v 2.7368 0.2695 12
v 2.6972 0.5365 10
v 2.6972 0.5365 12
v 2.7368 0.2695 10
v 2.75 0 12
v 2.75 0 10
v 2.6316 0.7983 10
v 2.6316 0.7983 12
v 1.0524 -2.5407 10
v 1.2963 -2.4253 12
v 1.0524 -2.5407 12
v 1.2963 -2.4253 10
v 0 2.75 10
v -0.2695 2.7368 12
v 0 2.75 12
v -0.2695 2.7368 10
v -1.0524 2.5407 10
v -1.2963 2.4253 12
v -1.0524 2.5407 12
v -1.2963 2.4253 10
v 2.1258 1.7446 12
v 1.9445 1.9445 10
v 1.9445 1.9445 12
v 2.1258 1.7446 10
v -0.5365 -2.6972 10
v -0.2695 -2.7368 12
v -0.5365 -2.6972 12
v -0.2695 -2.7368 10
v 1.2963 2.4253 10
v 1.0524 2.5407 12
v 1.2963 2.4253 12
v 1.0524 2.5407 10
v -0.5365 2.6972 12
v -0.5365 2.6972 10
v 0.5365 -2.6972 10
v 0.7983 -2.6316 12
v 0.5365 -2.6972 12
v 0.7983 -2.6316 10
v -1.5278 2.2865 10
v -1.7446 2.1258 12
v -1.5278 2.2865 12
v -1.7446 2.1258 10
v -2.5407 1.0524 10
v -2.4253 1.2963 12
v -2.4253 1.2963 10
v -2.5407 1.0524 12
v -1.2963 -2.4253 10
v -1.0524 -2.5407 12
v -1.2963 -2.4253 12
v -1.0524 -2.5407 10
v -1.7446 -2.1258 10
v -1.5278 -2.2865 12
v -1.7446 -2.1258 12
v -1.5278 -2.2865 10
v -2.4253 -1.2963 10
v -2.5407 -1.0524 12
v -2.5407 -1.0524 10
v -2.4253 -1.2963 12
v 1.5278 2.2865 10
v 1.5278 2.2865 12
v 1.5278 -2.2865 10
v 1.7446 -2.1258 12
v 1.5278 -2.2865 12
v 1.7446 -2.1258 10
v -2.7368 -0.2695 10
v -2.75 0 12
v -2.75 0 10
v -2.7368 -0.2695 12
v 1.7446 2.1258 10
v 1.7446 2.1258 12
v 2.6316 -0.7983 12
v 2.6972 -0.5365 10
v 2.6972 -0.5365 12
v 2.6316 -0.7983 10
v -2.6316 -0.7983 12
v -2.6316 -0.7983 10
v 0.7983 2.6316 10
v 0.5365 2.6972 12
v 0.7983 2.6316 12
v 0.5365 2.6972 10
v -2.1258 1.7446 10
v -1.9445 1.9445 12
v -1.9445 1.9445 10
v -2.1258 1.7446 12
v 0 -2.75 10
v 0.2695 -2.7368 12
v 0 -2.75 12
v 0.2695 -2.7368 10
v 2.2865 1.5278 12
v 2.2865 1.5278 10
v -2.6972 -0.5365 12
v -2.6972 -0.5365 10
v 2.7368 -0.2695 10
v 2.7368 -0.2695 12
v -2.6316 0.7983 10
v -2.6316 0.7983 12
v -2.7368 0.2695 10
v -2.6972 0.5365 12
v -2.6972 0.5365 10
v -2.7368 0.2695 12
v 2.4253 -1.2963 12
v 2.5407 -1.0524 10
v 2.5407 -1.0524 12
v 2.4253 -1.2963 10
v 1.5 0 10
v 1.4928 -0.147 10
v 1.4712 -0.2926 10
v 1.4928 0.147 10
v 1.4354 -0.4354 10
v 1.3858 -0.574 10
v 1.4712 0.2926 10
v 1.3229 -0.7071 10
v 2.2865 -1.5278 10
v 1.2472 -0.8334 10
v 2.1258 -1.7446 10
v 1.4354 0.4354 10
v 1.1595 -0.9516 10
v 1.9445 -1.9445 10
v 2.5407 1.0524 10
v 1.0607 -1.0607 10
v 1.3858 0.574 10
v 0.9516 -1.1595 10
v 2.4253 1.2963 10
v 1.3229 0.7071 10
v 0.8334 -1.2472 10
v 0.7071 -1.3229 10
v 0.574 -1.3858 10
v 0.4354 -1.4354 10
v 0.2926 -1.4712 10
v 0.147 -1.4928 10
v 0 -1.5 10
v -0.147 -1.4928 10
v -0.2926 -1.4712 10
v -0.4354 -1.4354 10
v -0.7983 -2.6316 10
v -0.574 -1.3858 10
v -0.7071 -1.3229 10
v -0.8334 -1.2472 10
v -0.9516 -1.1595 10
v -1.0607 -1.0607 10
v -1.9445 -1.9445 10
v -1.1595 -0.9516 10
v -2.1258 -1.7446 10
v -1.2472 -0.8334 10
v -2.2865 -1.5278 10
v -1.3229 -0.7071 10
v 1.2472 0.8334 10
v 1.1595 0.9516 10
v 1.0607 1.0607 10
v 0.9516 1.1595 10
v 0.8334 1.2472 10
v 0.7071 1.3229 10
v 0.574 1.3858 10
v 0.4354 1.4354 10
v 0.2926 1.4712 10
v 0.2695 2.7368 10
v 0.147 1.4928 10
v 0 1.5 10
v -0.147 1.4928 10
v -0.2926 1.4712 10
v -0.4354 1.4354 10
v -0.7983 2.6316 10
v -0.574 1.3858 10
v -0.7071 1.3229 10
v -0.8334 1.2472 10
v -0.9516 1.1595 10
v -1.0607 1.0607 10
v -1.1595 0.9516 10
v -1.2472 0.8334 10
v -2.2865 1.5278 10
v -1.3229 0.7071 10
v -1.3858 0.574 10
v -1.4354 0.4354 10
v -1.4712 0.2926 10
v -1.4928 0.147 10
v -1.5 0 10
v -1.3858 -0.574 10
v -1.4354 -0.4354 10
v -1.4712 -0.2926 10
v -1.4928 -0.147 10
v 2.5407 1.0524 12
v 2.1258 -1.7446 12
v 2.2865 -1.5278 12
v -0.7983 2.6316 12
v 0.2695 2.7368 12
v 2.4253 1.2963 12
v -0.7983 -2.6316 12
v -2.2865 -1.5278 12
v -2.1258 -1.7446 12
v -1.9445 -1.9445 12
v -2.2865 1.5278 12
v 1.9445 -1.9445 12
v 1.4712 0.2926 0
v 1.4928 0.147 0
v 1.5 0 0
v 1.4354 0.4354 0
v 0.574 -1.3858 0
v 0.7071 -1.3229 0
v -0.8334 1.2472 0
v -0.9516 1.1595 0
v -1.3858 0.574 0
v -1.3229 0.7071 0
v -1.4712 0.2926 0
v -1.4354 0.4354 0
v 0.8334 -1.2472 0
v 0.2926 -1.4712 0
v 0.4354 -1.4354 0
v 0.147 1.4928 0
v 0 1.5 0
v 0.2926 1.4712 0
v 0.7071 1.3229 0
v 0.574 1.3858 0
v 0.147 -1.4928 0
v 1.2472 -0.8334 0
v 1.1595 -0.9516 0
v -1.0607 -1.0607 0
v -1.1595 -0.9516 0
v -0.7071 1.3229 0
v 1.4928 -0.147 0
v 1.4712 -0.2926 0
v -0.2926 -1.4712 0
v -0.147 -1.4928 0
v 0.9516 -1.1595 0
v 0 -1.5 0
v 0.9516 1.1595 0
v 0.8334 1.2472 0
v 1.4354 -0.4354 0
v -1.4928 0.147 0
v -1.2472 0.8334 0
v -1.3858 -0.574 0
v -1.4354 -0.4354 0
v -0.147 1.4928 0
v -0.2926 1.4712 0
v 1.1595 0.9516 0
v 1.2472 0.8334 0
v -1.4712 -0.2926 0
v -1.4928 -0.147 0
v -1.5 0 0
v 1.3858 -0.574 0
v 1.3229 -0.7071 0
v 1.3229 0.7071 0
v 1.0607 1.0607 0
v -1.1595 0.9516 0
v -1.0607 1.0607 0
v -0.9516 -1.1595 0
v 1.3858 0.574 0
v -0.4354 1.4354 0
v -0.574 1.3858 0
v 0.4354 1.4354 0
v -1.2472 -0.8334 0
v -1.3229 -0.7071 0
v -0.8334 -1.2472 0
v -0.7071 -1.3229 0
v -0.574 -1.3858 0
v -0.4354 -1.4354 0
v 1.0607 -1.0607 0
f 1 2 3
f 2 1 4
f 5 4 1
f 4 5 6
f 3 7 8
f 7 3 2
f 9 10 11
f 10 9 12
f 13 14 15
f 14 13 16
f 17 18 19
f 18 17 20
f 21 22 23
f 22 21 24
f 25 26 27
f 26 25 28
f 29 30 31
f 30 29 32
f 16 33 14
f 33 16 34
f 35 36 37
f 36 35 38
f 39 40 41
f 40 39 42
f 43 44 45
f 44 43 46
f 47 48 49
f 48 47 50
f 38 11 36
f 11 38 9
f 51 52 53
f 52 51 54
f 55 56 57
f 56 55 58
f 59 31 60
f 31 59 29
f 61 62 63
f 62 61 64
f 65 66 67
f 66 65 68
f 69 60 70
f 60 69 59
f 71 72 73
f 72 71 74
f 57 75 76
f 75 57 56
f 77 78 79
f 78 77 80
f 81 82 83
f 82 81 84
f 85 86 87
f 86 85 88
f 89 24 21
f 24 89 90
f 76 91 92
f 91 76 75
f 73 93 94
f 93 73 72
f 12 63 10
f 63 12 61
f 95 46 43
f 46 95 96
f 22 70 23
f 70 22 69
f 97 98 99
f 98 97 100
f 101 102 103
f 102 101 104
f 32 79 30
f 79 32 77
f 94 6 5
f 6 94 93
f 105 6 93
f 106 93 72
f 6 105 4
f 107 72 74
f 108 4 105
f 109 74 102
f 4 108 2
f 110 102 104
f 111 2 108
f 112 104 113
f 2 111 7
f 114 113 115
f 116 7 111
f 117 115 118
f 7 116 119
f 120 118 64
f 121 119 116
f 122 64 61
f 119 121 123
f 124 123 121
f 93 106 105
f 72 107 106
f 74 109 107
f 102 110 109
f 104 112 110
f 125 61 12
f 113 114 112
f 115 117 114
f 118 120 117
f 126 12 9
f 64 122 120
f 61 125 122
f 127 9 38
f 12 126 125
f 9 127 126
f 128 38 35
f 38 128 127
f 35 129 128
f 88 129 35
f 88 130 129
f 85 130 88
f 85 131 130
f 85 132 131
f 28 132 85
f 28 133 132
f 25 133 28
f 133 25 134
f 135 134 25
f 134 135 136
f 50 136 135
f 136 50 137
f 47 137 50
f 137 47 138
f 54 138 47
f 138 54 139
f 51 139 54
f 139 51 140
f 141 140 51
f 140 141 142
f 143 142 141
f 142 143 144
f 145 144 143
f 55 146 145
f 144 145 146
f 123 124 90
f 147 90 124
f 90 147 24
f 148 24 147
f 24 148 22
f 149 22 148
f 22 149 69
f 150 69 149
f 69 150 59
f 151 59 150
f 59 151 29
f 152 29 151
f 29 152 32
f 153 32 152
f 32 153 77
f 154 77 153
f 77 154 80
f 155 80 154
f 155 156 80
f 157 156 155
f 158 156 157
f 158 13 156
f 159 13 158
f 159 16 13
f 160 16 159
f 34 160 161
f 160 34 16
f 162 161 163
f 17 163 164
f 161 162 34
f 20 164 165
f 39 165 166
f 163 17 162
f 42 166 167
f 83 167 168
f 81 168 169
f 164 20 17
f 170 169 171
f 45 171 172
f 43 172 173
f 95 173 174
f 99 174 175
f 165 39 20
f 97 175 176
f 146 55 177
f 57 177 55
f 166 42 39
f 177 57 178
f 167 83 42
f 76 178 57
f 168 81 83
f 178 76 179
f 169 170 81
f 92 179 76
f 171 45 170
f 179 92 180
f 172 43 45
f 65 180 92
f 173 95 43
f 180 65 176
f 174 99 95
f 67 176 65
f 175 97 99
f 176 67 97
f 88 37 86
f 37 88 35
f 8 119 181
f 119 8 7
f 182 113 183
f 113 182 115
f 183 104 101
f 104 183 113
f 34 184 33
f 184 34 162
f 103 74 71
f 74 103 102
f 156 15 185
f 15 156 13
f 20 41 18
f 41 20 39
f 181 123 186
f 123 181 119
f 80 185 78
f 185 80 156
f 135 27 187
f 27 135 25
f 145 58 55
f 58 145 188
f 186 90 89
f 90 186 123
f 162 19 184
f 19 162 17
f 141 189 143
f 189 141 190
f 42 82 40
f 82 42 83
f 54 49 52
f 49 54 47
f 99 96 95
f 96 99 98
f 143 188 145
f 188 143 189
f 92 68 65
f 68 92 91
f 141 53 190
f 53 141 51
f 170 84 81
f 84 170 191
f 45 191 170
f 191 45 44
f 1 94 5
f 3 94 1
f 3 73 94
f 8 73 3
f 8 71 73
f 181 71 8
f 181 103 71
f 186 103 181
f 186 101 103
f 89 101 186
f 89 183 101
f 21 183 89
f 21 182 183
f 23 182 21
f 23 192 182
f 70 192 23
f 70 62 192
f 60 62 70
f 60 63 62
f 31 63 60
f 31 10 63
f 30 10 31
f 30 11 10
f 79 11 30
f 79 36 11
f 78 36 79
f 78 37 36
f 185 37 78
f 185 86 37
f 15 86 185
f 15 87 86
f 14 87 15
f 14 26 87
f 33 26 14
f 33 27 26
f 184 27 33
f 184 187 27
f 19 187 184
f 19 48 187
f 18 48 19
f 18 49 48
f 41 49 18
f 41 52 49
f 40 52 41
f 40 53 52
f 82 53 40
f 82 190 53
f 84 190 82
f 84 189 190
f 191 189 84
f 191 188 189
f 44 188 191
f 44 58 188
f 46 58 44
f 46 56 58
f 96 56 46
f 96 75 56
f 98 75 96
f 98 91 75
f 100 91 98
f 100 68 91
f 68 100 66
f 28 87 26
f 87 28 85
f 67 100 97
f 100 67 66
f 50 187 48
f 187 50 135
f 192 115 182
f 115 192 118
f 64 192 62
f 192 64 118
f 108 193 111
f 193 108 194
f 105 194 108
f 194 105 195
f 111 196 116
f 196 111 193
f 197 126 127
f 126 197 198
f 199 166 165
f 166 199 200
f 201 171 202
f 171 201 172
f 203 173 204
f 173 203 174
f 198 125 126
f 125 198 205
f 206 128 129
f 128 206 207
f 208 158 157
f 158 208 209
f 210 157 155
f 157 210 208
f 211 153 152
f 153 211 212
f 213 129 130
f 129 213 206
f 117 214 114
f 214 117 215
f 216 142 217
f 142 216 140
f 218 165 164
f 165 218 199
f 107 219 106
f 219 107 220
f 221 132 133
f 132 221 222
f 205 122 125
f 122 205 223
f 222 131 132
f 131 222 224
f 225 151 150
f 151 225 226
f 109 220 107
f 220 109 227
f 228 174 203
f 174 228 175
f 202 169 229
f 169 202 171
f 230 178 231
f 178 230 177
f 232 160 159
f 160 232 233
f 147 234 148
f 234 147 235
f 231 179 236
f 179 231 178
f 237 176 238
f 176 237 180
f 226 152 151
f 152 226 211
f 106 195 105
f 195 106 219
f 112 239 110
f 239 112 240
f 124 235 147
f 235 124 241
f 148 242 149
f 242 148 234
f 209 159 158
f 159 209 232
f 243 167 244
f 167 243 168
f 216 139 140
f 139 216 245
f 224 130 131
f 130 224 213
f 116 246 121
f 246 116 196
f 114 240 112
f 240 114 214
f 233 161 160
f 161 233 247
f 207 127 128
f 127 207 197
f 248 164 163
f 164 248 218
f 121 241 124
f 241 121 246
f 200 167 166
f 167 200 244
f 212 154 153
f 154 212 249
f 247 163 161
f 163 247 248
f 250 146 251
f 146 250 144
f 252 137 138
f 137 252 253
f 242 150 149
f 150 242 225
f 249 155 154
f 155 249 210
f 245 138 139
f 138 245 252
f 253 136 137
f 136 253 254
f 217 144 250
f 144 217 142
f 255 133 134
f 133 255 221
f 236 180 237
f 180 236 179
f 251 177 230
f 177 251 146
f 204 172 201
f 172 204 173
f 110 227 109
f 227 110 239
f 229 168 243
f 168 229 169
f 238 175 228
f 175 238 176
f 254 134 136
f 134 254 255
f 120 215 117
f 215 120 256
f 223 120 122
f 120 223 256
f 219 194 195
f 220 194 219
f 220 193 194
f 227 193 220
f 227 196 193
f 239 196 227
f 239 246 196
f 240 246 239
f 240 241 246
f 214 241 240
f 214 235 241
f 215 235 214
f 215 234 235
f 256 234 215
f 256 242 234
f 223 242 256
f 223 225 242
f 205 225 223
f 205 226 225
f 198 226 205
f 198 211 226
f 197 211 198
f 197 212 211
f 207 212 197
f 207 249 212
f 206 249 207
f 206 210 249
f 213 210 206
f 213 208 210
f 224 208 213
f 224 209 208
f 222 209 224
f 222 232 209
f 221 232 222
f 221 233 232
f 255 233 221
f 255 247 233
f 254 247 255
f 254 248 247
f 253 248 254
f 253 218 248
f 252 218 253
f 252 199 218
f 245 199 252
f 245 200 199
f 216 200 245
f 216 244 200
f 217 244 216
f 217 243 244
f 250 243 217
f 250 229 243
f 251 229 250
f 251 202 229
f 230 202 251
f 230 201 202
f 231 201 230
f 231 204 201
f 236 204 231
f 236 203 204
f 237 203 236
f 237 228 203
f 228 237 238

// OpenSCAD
module pan_head_screw() {
    union() {
        // Screw head
        translate([0, 0, 10])
            cylinder(h=2.0, d=5.5, $fn=64);
        
        // Screw body
        cylinder(h=10, d=3.0, $fn=64);
    }
}

pan_head_screw();
